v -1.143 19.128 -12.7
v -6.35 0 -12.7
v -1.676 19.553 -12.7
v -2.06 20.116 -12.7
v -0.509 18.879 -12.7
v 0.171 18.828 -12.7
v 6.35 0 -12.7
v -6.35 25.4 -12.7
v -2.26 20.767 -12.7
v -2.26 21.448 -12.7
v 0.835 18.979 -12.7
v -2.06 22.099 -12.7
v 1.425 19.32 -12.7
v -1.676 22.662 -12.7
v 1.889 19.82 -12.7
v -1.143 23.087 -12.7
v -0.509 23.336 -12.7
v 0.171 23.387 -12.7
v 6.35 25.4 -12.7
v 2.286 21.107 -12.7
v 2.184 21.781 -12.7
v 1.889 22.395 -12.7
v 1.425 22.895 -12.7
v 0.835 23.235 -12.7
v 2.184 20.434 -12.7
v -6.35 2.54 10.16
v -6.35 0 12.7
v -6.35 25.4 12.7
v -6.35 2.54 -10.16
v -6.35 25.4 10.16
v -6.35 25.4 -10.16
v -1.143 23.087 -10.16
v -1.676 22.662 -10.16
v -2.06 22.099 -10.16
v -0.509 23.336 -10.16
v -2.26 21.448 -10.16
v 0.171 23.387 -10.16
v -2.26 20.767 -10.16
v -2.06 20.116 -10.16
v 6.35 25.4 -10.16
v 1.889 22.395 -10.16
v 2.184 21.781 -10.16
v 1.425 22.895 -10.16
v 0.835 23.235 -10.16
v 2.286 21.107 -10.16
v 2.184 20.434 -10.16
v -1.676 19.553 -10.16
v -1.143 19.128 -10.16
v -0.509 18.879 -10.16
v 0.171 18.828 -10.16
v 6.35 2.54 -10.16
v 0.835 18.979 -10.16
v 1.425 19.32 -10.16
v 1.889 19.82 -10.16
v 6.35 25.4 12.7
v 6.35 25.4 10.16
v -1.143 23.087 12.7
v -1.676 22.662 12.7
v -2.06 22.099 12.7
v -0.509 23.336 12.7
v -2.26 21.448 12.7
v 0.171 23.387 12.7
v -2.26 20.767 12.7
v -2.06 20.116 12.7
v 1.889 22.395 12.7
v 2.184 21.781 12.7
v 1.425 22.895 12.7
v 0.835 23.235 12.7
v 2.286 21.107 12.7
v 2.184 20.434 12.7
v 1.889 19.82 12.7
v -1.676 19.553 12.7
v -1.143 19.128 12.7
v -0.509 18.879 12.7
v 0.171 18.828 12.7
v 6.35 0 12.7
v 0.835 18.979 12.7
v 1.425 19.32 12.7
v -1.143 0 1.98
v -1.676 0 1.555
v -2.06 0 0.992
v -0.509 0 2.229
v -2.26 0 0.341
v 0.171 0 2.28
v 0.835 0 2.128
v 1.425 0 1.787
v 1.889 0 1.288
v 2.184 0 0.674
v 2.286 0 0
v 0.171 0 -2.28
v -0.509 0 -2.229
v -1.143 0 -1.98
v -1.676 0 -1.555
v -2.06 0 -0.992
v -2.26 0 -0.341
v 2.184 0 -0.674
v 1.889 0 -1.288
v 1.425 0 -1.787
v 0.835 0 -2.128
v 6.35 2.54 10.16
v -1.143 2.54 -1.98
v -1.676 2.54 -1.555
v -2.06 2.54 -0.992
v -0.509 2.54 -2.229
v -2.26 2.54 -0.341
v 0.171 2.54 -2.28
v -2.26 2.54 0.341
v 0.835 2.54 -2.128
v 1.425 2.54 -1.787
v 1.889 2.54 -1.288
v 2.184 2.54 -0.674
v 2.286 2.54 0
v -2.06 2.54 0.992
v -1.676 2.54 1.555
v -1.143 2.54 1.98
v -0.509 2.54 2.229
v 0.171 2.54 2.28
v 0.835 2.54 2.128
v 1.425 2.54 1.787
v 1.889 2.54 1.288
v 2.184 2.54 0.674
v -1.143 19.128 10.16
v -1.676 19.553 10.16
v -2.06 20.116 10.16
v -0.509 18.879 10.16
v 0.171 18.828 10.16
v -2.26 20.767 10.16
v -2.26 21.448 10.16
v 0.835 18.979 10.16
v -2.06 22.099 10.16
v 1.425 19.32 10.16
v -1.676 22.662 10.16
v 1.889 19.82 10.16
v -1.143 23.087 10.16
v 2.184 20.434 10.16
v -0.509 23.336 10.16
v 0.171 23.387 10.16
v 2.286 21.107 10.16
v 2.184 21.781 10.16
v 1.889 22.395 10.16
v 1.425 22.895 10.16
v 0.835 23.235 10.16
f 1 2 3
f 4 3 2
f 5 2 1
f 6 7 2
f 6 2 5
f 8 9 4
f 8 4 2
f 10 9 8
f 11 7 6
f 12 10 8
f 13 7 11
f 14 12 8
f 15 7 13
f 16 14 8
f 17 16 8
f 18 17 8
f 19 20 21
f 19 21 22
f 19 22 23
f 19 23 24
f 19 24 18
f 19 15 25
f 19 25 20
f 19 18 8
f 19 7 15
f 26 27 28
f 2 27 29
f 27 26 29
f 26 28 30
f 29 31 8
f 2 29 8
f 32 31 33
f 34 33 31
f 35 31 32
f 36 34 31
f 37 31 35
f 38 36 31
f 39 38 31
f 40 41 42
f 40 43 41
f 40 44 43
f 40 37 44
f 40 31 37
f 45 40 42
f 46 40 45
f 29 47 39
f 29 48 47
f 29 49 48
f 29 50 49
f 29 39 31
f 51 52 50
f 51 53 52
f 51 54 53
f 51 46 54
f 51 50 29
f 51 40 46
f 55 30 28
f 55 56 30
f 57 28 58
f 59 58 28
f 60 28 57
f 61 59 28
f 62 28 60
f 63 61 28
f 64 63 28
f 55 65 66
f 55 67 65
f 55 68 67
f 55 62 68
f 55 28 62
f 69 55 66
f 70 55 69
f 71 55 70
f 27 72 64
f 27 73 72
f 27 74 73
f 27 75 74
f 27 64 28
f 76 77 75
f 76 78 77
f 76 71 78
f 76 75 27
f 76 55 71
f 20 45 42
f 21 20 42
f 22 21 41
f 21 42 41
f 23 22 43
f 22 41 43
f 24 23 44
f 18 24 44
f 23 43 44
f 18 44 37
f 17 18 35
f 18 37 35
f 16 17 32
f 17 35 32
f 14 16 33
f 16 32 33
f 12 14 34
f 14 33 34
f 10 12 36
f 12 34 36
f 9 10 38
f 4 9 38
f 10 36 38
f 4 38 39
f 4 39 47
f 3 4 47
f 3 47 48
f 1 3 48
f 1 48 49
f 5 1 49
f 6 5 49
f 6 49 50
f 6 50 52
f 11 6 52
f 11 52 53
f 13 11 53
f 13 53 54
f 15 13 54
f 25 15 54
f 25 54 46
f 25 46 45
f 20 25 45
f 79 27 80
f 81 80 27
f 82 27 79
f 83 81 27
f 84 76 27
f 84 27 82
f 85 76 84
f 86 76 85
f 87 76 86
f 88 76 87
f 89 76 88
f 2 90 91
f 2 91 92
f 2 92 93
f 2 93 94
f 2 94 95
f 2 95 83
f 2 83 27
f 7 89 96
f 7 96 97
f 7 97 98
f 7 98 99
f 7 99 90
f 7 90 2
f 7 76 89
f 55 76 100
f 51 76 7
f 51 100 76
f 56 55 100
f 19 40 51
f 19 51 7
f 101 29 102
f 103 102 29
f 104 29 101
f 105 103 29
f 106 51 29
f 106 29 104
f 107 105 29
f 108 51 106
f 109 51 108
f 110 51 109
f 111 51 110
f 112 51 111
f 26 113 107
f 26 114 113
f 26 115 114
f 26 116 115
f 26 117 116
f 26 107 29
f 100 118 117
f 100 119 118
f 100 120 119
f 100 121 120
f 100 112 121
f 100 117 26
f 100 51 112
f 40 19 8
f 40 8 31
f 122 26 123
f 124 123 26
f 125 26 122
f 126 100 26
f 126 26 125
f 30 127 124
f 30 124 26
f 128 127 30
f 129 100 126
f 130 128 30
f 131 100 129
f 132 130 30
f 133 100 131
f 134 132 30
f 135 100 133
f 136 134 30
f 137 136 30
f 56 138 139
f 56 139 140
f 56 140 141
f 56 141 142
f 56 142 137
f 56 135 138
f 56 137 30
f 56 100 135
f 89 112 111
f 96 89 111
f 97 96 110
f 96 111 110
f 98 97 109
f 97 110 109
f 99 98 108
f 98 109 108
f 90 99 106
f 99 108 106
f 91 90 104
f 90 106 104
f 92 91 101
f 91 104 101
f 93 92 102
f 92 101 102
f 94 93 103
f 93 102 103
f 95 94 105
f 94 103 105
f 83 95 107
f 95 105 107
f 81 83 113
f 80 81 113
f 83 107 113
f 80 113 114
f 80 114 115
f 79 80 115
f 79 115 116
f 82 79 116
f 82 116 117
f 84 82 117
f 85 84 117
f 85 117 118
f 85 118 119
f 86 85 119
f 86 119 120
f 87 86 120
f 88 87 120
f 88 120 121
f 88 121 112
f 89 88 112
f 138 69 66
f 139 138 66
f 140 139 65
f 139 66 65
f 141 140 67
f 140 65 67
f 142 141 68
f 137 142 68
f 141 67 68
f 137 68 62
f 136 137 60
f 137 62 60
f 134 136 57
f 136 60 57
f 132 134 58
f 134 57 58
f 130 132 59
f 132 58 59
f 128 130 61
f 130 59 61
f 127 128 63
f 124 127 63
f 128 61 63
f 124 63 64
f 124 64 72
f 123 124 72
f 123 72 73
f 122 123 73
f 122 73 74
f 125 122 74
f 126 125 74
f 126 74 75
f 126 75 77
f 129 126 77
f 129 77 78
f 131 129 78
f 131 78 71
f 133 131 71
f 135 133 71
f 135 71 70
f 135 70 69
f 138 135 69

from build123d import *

# Parameters (mm, degrees)
EXTRUDE_THIN1_DEPTH     = 6.35
SKETCH4_R               = 2.286
CUT_EXTRUDE1_DEPTH      = 1
CUT_EXTRUDE1_DEPTH_BACK = 26.4
SKETCH5_R               = 2.286
CUT_EXTRUDE2_DEPTH      = 3.54


with BuildPart() as part:
    # Sketch1 → Extrude-Thin1 (new body, symmetric)
    with BuildSketch(Plane(origin=(0, 0, 0), x_dir=(0, 0, -1), z_dir=(1, 0, 0))):
        Polygon((-12.7, 25.4), (-12.7, 0), (12.7, 0), (12.7, 25.4), (10.16, 25.4), (10.16, 2.54), (-10.16, 2.54), (-10.16, 25.4), align=None)
    extrude(amount=EXTRUDE_THIN1_DEPTH, both=True)

    # Sketch4 → Cut-Extrude1 (cut, two sides)
    with BuildSketch(Plane.XY.offset(12.7)) as cut_extrude1_sk:
        with Locations((0, 21.1074)):
            Circle(SKETCH4_R)
    extrude(amount=CUT_EXTRUDE1_DEPTH, mode=Mode.SUBTRACT)
    extrude(cut_extrude1_sk.sketch, amount=-CUT_EXTRUDE1_DEPTH_BACK, mode=Mode.SUBTRACT)

    # Sketch5 → Cut-Extrude2 (cut, through all)
    with BuildSketch(Plane(origin=(0, 2.54, 0), x_dir=(1, 0, 0), z_dir=(0, 1, 0))):
        Circle(SKETCH5_R)
    extrude(amount=-CUT_EXTRUDE2_DEPTH, mode=Mode.SUBTRACT)


solid = part.part
